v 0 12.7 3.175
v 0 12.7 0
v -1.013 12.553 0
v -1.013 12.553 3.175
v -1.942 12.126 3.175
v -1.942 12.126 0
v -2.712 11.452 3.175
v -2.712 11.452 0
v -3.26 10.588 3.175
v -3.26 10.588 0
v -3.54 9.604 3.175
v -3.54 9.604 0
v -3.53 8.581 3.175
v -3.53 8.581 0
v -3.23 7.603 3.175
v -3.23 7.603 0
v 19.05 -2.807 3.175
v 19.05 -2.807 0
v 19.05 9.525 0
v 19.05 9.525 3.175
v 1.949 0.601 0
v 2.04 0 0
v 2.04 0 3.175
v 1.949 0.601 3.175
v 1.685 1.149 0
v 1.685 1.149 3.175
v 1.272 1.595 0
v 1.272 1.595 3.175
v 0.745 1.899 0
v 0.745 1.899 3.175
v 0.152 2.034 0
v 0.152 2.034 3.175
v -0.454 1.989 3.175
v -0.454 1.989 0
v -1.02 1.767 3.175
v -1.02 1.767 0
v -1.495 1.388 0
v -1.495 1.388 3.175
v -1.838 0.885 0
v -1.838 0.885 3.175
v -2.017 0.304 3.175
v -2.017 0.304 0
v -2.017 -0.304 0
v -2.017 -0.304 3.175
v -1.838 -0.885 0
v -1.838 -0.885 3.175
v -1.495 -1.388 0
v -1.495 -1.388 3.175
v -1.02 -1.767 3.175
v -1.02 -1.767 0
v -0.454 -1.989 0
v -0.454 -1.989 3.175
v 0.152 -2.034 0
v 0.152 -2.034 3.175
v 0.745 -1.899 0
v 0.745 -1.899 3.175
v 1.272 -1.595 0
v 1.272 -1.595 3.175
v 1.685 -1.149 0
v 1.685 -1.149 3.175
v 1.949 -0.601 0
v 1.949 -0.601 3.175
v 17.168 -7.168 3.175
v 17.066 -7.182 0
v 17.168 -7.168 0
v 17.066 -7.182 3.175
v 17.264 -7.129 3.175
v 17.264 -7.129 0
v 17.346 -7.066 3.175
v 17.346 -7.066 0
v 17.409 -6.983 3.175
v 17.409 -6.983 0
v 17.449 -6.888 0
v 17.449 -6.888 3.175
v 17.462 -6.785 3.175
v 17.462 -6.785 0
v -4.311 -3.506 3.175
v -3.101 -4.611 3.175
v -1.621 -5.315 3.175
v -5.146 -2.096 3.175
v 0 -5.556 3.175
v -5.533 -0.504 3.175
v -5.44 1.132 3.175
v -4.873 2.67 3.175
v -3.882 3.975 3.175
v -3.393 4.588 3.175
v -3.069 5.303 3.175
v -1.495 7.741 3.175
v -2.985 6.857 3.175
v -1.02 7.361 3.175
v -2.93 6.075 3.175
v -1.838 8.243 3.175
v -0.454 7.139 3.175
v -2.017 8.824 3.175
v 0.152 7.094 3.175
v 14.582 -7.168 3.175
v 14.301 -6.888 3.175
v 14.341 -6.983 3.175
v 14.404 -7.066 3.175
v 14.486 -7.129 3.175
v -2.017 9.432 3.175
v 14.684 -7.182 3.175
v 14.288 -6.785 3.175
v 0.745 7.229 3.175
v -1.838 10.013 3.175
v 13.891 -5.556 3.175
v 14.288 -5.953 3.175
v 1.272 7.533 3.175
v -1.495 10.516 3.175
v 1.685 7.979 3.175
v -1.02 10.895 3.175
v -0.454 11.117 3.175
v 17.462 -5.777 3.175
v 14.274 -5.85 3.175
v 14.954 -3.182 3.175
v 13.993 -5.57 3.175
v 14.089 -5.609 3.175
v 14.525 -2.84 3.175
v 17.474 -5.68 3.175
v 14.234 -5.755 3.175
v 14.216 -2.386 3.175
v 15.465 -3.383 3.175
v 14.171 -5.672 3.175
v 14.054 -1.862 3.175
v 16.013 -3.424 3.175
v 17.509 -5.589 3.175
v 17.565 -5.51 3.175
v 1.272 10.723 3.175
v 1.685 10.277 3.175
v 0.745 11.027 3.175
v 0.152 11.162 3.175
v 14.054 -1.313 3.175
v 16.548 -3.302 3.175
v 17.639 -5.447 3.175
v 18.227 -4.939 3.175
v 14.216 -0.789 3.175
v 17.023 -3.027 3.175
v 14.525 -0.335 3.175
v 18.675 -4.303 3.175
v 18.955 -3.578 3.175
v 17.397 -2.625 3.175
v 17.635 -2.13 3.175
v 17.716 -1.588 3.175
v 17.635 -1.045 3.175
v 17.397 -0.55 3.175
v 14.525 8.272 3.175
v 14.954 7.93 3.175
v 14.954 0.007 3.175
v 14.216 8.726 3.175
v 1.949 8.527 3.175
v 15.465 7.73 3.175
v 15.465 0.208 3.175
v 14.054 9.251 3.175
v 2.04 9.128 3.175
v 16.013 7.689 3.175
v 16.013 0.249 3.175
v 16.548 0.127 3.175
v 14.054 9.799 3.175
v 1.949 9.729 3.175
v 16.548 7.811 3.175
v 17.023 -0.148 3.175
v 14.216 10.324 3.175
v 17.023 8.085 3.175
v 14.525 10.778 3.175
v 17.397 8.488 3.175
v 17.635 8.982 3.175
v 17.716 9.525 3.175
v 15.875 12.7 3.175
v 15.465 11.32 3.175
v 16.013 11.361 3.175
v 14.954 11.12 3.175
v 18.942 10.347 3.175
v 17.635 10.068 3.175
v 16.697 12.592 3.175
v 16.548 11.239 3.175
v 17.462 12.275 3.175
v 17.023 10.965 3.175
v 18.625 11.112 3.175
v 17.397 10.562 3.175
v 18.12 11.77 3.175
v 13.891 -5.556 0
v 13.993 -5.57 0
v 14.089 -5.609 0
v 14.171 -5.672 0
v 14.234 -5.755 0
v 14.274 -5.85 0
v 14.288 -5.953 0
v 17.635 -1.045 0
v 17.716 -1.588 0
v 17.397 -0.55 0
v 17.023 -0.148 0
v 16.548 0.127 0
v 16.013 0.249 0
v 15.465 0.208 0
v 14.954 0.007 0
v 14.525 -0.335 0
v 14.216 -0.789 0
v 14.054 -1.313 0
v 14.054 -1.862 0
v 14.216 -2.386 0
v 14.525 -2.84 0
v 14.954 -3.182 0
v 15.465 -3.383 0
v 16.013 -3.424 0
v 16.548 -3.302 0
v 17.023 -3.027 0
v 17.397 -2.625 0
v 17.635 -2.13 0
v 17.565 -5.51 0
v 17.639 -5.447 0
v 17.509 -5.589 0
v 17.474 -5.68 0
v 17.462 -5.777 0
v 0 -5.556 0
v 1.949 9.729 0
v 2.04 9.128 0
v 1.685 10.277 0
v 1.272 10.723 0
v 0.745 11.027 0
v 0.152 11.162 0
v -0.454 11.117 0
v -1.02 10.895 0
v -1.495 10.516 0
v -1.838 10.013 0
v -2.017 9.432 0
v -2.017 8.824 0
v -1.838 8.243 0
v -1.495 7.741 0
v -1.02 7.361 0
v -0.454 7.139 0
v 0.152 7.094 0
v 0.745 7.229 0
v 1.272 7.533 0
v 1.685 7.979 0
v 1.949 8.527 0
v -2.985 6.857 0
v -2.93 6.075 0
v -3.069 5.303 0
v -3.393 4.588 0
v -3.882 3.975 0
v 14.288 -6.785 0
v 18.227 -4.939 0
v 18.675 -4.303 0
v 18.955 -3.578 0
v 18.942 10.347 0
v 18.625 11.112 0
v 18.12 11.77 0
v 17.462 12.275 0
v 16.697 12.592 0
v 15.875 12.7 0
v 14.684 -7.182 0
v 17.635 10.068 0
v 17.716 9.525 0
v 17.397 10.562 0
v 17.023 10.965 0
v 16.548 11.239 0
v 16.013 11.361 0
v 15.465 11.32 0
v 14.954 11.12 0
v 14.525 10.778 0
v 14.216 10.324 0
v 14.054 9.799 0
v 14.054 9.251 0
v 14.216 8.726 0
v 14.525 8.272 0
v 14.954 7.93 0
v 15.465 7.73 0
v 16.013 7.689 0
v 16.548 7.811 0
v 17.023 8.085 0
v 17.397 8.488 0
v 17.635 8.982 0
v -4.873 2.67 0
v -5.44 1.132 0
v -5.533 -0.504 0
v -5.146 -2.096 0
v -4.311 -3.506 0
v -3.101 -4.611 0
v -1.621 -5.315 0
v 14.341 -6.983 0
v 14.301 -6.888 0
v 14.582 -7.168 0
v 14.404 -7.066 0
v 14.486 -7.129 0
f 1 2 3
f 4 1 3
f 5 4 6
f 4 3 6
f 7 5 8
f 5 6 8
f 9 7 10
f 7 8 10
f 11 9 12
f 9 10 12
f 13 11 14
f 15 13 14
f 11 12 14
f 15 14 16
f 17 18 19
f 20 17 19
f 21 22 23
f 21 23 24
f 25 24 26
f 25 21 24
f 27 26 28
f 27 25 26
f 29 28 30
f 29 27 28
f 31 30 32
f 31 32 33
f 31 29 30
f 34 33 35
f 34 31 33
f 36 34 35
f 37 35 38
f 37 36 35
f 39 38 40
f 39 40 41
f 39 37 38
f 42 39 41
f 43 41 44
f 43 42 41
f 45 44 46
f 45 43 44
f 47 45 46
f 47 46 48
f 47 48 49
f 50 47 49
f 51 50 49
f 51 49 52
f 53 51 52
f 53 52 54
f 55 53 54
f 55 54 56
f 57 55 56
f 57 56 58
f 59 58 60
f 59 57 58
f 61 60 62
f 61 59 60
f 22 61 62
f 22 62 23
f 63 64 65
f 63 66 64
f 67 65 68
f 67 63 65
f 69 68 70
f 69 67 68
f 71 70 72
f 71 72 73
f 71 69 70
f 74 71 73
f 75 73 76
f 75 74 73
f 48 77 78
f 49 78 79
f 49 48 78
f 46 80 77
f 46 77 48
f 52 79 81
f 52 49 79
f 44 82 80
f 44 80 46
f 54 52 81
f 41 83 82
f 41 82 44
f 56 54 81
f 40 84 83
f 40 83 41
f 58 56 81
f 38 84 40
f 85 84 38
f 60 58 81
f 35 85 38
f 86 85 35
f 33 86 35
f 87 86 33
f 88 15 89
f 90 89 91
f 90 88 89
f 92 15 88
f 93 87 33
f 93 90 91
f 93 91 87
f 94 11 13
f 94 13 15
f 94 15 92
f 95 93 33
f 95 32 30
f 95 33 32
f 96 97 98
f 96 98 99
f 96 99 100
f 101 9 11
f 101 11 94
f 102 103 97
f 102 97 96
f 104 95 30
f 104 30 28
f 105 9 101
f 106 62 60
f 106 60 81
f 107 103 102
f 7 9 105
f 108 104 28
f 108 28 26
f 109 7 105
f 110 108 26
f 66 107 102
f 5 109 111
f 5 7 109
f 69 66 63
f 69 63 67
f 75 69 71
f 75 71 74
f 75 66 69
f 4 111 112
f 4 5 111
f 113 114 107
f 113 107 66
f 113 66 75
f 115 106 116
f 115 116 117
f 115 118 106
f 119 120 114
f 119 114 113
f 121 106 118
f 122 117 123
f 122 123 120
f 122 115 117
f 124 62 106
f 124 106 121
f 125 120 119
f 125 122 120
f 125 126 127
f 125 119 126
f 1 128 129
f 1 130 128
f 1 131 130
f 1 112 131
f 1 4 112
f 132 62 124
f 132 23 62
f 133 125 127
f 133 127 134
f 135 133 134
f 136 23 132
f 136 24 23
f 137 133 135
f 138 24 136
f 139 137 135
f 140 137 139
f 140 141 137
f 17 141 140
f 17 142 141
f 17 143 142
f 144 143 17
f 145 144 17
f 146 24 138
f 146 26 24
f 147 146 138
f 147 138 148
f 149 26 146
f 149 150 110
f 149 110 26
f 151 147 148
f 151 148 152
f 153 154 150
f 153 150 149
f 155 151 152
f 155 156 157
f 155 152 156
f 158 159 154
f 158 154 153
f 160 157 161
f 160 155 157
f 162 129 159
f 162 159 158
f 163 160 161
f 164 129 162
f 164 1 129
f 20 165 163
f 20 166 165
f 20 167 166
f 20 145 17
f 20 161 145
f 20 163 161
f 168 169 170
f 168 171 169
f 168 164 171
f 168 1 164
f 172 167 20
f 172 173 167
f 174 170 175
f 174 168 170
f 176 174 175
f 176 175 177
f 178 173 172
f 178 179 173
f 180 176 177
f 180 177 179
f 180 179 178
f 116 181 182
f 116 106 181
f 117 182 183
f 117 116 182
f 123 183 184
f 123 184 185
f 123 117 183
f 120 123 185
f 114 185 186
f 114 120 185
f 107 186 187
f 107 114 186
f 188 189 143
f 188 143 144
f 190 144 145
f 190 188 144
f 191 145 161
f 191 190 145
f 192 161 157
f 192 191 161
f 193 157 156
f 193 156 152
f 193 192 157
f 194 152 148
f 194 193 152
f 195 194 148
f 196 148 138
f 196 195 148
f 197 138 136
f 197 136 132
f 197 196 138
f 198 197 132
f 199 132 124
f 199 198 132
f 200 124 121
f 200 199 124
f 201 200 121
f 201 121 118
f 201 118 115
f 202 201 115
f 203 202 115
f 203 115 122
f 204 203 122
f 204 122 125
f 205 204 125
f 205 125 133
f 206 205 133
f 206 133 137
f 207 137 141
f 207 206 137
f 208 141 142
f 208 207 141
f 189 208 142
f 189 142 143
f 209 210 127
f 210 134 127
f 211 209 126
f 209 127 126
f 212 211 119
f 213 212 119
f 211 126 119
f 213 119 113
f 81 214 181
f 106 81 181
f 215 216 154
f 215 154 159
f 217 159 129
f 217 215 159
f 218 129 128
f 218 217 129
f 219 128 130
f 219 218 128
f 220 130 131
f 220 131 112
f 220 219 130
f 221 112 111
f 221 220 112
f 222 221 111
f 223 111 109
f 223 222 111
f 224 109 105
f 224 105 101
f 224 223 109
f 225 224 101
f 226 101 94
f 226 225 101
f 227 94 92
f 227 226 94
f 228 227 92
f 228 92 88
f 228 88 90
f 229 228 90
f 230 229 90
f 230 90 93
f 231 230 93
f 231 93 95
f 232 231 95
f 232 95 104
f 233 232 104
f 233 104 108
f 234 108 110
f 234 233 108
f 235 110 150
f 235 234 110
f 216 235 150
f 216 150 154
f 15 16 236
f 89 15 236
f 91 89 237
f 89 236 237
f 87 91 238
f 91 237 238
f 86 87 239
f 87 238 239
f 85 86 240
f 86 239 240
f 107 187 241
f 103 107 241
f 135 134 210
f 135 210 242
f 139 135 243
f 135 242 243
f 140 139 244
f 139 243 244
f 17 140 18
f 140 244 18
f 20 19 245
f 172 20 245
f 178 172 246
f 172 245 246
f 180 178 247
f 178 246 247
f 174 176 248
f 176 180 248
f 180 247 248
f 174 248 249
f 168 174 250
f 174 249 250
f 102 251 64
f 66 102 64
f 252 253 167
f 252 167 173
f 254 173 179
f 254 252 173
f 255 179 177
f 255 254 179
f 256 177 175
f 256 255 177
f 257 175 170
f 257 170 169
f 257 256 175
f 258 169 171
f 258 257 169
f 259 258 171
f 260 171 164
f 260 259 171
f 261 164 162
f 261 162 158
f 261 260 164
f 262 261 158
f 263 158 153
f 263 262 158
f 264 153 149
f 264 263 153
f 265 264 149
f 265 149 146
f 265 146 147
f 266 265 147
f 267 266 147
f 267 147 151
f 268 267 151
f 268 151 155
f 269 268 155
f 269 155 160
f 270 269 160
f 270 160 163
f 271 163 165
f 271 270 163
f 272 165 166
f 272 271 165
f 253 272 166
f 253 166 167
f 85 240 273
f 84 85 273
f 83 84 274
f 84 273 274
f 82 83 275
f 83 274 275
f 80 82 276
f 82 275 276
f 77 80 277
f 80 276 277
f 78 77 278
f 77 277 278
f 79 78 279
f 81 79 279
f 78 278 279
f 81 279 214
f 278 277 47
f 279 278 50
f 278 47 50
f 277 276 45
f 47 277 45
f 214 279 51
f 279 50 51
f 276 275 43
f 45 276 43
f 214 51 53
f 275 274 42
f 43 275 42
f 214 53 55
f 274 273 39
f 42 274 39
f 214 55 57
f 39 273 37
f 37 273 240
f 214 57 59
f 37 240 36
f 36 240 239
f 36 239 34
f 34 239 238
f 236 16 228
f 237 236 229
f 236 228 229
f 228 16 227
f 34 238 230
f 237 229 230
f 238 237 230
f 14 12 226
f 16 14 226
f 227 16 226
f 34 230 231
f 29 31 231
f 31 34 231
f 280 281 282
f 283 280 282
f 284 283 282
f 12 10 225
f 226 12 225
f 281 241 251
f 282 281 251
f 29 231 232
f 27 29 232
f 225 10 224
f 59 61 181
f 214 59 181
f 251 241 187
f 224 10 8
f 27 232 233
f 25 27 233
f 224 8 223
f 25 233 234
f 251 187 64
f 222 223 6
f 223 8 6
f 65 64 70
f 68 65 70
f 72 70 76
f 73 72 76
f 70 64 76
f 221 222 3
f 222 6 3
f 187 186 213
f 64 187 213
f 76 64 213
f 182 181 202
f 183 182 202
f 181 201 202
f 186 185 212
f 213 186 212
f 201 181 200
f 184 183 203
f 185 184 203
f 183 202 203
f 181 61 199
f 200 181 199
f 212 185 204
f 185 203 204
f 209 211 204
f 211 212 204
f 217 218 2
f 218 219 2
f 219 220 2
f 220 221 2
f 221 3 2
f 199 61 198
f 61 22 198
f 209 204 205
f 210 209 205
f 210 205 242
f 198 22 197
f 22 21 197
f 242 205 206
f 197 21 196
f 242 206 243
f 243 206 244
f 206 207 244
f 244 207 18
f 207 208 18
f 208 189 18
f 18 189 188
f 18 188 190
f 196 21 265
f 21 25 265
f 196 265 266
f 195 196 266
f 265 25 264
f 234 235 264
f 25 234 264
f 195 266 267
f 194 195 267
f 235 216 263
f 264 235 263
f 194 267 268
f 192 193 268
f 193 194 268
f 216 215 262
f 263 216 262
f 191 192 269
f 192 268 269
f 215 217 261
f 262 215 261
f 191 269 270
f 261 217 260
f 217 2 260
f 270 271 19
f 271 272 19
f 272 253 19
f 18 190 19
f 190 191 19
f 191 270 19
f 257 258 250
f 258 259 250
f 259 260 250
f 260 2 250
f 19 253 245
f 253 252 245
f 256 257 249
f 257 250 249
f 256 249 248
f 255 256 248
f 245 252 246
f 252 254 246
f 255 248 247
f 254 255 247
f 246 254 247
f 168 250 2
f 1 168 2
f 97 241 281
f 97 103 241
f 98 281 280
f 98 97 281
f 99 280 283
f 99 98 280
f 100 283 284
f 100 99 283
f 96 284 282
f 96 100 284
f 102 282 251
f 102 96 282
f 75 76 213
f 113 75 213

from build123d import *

# Parameters (mm, degrees)
SKETCH3_R           = 1.8415
SKETCH3_R_2         = 2.0399375
BOSS_EXTRUDE1_DEPTH = 3.175
FILLET1_R           = 3.175
FILLET2_R           = 0.396875


with BuildPart() as part:
    # Sketch3 → Boss-Extrude1 (new body)
    with BuildSketch(Plane.XY):
        with BuildLine():
            Line((0, -5.55625), (14.2875, -5.55625))
            Line((14.2875, -5.55625), (14.2875, -7.18185))
            Line((14.2875, -7.18185), (17.4625, -7.18185))
            Line((17.4625, -7.18185), (17.4625, -5.55625))
            Line((17.4625, -5.55625), (19.05, -5.55625))
            Line((19.05, -5.55625), (19.05, 12.7))
            Line((19.05, 12.7), (0, 12.7))
            ThreePointArc((0, 12.7), (-3.017240851, 11.039812386), (-3.229688204, 7.602541465))
            ThreePointArc((-3.229688204, 7.602541465), (-2.975666517, 5.684416089), (-3.882150485, 3.975024739))
            ThreePointArc((-3.882150485, 3.975024739), (-5.145782024, -2.095910644), (0, -5.55625))
        make_face()
        with Locations((15.875, 9.525)):
            Circle(SKETCH3_R, mode=Mode.SUBTRACT)
        with Locations((15.875, -1.5875)):
            Circle(SKETCH3_R, mode=Mode.SUBTRACT)
        with Locations((0, 9.128125)):
            Circle(SKETCH3_R_2, mode=Mode.SUBTRACT)
        Circle(SKETCH3_R_2, mode=Mode.SUBTRACT)
    extrude(amount=BOSS_EXTRUDE1_DEPTH)

    # Fillet1
    # the kernel refuses this fillet: 3.175 mm, written as the material it takes off along each edge
    with BuildSketch(Plane(origin=(19.05, -5.55625, -6.874076643), x_dir=(-1, 0, 0), z_dir=(0, 0, 1))) as fillet1_piece_1:
        with BuildLine():
            CenterArc((3.175, -2.749630657), FILLET1_R, 120, 60)
            Line((0, -2.749630657), (-0.0635, -2.749630657))
            Line((-0.0635, -2.749630657), (-0.0635, 0))
            Line((-0.0635, 0), (0, 0.0635))
            ThreePointArc((0, 0.0635), (0.79375, 0.0635), (1.55575, 0.054992613))
            Line((1.55575, 0.054992613), (1.5875, 0))
        make_face()
    extrude(amount=16.923153285, mode=Mode.SUBTRACT)
    with BuildSketch(Plane(origin=(19.05, 12.7, -7.9375), x_dir=(0, -1, 0), z_dir=(0, 0, 1))) as fillet1_piece_2:
        with BuildLine():
            CenterArc((FILLET1_R, -FILLET1_R), FILLET1_R, 90, 90)
            Line((0, -FILLET1_R), (-FILLET1_R * 0.02, -FILLET1_R))
            Line((-FILLET1_R * 0.02, -FILLET1_R), (-FILLET1_R * 0.02, FILLET1_R * 0.02))
            Line((-FILLET1_R * 0.02, FILLET1_R * 0.02), (FILLET1_R, FILLET1_R * 0.02))
            Line((FILLET1_R, FILLET1_R * 0.02), (FILLET1_R, 0))
        make_face()
    extrude(amount=19.05, mode=Mode.SUBTRACT)

    # Fillet2
    fillet2_edges = [part.edges().sort_by_distance(p)[0] for p in [
        (17.4625, -5.55625, 1.5875),
        (17.4625, -7.18185, 1.5875),
        (14.2875, -7.18185, 1.5875),
        (14.2875, -5.55625, 1.5875),
    ]]
    fillet(fillet2_edges, radius=FILLET2_R)


solid = part.part
